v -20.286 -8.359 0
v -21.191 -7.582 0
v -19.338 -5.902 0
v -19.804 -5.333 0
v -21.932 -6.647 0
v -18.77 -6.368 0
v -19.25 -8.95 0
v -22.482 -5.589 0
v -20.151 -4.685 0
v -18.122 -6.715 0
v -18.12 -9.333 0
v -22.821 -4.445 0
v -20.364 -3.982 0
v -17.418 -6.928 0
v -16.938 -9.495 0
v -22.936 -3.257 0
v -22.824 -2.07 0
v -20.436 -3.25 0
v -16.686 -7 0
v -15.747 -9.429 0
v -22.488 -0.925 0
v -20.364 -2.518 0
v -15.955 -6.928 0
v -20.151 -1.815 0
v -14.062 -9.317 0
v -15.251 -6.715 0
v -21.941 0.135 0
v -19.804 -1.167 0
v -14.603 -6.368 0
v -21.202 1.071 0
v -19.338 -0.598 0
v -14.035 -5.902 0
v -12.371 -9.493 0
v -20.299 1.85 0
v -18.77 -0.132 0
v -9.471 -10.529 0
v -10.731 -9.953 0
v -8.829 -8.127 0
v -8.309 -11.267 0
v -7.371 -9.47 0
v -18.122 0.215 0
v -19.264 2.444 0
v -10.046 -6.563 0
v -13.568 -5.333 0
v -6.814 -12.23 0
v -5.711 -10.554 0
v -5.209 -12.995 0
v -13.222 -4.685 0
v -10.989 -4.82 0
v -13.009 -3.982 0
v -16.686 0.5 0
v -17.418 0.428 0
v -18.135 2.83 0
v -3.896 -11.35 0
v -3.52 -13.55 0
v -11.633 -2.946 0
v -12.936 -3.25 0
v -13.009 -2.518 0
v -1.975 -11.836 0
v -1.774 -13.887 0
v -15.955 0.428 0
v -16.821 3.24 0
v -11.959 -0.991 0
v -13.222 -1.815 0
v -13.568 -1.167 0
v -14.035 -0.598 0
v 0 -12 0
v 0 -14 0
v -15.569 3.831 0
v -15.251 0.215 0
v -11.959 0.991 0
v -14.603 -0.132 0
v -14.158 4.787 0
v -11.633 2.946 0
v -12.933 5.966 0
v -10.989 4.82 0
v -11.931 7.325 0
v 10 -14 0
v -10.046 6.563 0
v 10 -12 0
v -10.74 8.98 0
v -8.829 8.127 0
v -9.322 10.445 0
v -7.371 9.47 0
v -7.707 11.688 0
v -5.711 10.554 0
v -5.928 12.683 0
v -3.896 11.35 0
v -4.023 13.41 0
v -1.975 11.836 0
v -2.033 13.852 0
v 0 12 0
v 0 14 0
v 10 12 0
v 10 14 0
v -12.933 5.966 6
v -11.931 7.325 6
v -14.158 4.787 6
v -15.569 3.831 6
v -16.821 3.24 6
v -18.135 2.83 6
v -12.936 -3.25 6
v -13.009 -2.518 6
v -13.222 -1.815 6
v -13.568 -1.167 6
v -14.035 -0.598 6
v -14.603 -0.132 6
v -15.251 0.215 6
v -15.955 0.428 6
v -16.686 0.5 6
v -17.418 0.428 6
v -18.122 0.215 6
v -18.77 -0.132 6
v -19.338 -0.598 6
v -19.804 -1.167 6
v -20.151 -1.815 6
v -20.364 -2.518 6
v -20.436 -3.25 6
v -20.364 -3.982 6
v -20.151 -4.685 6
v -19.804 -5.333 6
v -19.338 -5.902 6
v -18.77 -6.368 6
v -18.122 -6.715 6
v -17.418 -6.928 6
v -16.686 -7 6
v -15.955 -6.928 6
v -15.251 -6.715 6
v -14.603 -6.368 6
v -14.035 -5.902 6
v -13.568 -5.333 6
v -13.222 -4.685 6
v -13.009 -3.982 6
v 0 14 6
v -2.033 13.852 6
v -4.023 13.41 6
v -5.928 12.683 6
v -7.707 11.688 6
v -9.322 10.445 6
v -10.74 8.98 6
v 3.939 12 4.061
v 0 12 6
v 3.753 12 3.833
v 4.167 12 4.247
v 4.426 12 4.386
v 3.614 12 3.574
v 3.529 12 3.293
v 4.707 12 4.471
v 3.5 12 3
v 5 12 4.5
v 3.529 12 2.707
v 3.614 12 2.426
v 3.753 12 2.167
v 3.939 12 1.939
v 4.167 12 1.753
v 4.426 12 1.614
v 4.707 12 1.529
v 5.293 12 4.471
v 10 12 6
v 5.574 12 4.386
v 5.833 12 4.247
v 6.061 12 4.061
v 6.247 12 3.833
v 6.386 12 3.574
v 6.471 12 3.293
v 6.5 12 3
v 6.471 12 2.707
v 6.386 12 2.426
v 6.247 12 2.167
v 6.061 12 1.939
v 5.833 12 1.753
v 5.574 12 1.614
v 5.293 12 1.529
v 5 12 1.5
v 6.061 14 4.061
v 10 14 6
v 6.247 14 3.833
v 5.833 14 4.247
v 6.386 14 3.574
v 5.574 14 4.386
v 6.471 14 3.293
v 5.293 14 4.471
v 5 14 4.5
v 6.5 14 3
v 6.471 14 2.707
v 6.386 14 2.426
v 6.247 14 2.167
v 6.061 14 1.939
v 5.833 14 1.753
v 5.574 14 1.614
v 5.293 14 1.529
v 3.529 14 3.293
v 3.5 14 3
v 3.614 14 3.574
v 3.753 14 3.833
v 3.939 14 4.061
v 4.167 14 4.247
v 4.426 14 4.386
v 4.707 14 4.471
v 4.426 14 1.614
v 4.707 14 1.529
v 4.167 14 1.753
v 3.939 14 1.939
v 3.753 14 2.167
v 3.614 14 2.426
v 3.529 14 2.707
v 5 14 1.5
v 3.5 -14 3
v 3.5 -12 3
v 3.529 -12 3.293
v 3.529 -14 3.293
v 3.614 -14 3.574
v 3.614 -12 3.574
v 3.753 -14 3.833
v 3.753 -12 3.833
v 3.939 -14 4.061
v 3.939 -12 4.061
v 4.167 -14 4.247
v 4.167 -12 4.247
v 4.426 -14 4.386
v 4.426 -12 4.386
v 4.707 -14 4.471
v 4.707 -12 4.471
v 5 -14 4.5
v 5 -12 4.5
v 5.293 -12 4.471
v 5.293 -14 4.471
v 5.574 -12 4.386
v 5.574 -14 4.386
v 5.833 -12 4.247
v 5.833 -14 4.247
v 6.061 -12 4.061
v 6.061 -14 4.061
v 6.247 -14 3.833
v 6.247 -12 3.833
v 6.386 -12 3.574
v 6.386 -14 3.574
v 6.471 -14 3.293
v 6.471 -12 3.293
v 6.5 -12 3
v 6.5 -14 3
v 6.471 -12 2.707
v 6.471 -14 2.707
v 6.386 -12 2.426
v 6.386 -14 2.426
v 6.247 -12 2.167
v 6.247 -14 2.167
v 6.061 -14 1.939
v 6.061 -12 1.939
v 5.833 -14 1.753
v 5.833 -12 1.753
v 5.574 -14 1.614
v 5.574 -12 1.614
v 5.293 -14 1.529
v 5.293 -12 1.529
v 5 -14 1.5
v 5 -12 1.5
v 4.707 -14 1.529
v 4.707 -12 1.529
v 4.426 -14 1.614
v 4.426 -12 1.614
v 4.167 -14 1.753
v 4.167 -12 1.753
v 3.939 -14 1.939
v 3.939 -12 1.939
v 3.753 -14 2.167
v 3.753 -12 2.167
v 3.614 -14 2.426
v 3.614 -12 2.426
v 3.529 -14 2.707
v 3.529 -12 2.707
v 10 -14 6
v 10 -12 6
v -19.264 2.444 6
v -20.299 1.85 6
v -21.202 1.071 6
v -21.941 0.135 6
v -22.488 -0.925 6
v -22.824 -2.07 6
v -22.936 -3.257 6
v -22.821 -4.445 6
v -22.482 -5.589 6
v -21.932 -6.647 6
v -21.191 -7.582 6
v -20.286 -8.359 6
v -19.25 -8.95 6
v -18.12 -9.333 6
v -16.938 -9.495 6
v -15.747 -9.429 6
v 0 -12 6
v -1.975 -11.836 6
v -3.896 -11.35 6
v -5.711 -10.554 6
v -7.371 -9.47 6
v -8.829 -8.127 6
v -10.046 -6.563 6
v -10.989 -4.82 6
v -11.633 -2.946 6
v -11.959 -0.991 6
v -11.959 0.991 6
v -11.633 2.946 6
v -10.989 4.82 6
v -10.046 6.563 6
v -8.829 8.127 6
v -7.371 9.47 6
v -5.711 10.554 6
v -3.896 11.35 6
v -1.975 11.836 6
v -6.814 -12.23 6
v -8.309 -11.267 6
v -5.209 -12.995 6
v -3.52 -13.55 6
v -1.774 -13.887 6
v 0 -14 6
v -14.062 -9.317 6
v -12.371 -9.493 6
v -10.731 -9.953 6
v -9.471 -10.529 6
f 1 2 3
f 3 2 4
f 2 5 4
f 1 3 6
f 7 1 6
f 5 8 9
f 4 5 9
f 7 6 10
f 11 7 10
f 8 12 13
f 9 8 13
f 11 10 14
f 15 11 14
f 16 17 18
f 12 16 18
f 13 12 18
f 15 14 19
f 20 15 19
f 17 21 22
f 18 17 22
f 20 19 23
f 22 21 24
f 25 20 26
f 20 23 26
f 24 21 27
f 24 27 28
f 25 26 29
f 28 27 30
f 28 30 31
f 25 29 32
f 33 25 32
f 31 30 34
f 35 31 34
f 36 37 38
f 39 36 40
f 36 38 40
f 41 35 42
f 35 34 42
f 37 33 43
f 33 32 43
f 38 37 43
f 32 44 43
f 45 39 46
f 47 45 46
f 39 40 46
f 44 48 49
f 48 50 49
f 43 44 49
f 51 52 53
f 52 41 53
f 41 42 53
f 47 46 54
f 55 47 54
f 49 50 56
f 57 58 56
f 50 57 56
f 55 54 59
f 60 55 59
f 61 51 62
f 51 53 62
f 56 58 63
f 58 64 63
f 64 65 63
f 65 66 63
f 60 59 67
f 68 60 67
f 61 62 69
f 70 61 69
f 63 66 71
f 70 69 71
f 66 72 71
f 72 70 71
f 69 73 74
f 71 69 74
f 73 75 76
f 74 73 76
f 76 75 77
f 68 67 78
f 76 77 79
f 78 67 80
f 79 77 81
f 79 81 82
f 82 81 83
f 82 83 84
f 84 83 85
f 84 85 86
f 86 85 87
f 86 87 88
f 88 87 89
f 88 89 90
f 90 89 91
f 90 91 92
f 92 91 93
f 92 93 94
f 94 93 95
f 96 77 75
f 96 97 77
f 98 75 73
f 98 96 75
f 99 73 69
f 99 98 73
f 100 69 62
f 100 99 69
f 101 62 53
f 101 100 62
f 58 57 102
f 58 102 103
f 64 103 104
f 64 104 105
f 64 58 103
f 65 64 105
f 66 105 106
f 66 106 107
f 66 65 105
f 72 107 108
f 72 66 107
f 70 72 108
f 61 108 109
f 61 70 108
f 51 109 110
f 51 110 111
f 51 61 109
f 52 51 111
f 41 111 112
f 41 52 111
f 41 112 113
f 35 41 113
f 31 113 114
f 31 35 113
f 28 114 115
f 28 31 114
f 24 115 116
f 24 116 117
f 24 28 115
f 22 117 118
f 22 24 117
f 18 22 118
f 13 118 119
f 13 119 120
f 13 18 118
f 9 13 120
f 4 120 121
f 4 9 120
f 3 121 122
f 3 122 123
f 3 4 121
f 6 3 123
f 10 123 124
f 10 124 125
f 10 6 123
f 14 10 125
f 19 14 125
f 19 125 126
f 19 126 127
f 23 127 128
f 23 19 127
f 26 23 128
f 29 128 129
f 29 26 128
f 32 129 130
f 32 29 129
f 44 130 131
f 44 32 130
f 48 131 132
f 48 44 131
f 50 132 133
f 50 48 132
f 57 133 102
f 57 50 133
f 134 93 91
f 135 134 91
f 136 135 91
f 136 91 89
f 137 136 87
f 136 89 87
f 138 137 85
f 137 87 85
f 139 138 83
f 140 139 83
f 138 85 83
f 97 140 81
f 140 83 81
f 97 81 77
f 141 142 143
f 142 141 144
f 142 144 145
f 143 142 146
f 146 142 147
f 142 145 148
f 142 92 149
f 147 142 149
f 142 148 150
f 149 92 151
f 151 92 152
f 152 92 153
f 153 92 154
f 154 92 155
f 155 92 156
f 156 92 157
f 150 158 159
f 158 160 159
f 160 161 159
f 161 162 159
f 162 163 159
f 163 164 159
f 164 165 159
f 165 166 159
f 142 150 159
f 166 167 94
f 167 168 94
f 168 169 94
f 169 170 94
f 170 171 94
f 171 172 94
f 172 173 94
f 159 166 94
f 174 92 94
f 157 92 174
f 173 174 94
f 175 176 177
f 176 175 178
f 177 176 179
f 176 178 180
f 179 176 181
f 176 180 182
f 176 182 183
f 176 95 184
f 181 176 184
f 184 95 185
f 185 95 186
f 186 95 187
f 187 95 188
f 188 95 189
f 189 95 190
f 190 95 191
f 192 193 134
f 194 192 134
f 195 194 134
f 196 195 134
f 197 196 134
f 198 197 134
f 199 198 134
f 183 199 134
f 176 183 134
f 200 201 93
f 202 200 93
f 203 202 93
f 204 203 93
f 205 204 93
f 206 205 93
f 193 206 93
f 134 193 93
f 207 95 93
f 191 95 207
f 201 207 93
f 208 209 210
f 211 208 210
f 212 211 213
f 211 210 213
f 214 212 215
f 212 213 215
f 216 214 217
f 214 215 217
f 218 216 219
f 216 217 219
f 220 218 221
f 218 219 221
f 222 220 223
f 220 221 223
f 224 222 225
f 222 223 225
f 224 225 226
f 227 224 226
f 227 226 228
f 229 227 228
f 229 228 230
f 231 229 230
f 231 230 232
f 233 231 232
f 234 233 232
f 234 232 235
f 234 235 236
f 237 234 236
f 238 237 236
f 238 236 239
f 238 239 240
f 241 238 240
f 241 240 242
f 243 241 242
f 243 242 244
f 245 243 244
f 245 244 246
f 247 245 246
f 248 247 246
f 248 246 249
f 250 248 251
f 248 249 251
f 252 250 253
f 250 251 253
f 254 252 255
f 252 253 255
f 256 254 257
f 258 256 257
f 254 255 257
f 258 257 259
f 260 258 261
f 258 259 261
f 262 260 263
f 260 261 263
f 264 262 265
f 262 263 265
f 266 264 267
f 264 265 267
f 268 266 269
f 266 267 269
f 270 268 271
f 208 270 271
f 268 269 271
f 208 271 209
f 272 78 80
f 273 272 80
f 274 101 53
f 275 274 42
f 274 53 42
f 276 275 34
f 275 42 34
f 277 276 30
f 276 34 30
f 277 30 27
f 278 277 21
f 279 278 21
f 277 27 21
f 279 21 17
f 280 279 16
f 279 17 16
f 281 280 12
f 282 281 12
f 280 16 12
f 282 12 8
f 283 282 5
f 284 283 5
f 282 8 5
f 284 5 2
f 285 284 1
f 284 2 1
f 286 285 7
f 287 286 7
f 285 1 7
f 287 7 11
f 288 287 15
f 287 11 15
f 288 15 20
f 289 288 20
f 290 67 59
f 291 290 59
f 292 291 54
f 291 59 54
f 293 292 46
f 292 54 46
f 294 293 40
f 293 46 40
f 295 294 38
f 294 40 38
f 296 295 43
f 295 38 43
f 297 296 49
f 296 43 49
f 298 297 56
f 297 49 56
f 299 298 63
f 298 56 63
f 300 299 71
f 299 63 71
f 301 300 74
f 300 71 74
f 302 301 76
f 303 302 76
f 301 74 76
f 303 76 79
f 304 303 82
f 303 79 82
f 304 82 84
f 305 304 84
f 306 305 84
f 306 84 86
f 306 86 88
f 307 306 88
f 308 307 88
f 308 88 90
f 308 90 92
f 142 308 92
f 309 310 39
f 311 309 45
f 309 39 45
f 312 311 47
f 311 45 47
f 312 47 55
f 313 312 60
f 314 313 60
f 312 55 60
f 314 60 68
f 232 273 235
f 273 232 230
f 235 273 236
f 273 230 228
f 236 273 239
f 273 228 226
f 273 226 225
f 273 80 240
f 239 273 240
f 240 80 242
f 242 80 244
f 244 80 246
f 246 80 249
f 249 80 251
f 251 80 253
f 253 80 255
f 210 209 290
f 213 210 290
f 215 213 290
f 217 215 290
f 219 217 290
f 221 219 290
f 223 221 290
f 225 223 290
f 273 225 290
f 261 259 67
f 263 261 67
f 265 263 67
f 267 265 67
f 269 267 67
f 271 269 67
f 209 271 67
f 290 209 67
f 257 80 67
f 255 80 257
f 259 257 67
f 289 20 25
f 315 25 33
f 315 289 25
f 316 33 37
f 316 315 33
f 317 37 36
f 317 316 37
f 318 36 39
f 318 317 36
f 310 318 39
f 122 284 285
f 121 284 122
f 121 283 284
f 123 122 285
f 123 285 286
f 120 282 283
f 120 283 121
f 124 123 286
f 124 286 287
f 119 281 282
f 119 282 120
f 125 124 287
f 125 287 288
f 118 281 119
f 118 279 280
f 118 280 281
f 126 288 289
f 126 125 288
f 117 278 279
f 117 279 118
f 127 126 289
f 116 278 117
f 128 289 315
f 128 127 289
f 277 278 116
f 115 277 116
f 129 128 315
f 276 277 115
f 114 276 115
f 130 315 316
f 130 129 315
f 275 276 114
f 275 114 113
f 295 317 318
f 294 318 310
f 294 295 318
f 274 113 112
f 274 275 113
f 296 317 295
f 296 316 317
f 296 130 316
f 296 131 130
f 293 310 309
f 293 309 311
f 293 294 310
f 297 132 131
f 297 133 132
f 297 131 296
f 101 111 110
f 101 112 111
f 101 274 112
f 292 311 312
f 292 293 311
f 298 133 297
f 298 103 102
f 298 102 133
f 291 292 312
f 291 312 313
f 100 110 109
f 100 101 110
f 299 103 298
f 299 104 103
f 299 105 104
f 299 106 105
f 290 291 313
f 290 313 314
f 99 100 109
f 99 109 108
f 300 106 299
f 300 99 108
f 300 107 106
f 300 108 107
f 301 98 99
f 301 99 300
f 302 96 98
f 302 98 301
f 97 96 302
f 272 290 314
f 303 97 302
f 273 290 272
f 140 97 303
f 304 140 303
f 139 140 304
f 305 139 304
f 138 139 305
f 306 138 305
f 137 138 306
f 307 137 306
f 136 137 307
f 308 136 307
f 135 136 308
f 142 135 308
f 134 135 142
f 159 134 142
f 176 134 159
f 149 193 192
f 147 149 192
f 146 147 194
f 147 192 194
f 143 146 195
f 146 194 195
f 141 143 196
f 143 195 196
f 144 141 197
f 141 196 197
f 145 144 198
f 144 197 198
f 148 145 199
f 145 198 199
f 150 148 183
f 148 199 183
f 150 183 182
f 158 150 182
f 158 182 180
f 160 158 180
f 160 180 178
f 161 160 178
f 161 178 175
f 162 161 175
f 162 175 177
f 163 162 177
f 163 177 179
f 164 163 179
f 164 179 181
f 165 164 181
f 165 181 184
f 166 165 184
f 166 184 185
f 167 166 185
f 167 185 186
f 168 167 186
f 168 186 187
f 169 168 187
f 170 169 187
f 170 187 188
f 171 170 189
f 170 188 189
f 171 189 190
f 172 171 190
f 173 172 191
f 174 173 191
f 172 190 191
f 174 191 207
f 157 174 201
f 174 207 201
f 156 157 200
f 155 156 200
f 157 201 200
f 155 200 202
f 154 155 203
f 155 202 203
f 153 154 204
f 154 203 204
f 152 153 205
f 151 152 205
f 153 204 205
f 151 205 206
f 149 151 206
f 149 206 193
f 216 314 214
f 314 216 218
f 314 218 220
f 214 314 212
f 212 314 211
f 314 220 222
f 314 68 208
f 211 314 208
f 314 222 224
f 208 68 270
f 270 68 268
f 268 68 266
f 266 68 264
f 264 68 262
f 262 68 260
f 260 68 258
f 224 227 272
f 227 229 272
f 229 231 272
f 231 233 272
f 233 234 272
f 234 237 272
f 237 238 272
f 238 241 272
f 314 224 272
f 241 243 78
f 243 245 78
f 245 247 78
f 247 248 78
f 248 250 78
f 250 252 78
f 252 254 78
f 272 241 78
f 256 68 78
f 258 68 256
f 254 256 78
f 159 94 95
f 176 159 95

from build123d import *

# Parameters (mm, degrees)
SKETCH1_R           = 3.75
BOSS_EXTRUDE1_DEPTH = 6
SKETCH2_R           = 1.5
CUT_EXTRUDE1_DEPTH  = 39
FILLET1_R           = 10


with BuildPart() as part:
    # Sketch1 → Boss-Extrude1 (new body)
    with BuildSketch(Plane.XY):
        with BuildLine():
            Line((0, 12), (10, 12))
            Line((10, 12), (10, 14))
            Line((10, 14), (0, 14))
            ThreePointArc((0, 14), (-9.050345568, 10.681350341), (-13.809987388, 2.2987493))
            ThreePointArc((-13.809987388, 2.2987493), (-22.82117325, -4.444834248), (-11.937810072, -7.313596289))
            ThreePointArc((-11.937810072, -7.313596289), (-6.841405263, -12.214547639), (0, -14))
            Line((0, -14), (10, -14))
            Line((10, -14), (10, -12))
            Line((10, -12), (0, -12))
            ThreePointArc((0, -12), (-12, 0), (0, 12))
        make_face()
        with Locations((-16.686449258, -3.249986332)):
            Circle(SKETCH1_R, mode=Mode.SUBTRACT)
    extrude(amount=BOSS_EXTRUDE1_DEPTH)

    # Sketch2 → Cut-Extrude1 (cut)
    with BuildSketch(Plane(origin=(0, 14, 0), x_dir=(1, 0, 0), z_dir=(0, 1, 0))):
        with Locations(Location((5, -3, 0), (0, 0, 180))):
            Circle(SKETCH2_R)
    extrude(amount=-CUT_EXTRUDE1_DEPTH, mode=Mode.SUBTRACT)

    # Fillet1
    fillet1_edges = [part.edges().sort_by_distance(p)[0] for p in [
        (-11.937810072, -7.313596289, 3),
        (-13.809987388, 2.2987493, 3),
    ]]
    fillet(fillet1_edges, radius=FILLET1_R)


solid = part.part
